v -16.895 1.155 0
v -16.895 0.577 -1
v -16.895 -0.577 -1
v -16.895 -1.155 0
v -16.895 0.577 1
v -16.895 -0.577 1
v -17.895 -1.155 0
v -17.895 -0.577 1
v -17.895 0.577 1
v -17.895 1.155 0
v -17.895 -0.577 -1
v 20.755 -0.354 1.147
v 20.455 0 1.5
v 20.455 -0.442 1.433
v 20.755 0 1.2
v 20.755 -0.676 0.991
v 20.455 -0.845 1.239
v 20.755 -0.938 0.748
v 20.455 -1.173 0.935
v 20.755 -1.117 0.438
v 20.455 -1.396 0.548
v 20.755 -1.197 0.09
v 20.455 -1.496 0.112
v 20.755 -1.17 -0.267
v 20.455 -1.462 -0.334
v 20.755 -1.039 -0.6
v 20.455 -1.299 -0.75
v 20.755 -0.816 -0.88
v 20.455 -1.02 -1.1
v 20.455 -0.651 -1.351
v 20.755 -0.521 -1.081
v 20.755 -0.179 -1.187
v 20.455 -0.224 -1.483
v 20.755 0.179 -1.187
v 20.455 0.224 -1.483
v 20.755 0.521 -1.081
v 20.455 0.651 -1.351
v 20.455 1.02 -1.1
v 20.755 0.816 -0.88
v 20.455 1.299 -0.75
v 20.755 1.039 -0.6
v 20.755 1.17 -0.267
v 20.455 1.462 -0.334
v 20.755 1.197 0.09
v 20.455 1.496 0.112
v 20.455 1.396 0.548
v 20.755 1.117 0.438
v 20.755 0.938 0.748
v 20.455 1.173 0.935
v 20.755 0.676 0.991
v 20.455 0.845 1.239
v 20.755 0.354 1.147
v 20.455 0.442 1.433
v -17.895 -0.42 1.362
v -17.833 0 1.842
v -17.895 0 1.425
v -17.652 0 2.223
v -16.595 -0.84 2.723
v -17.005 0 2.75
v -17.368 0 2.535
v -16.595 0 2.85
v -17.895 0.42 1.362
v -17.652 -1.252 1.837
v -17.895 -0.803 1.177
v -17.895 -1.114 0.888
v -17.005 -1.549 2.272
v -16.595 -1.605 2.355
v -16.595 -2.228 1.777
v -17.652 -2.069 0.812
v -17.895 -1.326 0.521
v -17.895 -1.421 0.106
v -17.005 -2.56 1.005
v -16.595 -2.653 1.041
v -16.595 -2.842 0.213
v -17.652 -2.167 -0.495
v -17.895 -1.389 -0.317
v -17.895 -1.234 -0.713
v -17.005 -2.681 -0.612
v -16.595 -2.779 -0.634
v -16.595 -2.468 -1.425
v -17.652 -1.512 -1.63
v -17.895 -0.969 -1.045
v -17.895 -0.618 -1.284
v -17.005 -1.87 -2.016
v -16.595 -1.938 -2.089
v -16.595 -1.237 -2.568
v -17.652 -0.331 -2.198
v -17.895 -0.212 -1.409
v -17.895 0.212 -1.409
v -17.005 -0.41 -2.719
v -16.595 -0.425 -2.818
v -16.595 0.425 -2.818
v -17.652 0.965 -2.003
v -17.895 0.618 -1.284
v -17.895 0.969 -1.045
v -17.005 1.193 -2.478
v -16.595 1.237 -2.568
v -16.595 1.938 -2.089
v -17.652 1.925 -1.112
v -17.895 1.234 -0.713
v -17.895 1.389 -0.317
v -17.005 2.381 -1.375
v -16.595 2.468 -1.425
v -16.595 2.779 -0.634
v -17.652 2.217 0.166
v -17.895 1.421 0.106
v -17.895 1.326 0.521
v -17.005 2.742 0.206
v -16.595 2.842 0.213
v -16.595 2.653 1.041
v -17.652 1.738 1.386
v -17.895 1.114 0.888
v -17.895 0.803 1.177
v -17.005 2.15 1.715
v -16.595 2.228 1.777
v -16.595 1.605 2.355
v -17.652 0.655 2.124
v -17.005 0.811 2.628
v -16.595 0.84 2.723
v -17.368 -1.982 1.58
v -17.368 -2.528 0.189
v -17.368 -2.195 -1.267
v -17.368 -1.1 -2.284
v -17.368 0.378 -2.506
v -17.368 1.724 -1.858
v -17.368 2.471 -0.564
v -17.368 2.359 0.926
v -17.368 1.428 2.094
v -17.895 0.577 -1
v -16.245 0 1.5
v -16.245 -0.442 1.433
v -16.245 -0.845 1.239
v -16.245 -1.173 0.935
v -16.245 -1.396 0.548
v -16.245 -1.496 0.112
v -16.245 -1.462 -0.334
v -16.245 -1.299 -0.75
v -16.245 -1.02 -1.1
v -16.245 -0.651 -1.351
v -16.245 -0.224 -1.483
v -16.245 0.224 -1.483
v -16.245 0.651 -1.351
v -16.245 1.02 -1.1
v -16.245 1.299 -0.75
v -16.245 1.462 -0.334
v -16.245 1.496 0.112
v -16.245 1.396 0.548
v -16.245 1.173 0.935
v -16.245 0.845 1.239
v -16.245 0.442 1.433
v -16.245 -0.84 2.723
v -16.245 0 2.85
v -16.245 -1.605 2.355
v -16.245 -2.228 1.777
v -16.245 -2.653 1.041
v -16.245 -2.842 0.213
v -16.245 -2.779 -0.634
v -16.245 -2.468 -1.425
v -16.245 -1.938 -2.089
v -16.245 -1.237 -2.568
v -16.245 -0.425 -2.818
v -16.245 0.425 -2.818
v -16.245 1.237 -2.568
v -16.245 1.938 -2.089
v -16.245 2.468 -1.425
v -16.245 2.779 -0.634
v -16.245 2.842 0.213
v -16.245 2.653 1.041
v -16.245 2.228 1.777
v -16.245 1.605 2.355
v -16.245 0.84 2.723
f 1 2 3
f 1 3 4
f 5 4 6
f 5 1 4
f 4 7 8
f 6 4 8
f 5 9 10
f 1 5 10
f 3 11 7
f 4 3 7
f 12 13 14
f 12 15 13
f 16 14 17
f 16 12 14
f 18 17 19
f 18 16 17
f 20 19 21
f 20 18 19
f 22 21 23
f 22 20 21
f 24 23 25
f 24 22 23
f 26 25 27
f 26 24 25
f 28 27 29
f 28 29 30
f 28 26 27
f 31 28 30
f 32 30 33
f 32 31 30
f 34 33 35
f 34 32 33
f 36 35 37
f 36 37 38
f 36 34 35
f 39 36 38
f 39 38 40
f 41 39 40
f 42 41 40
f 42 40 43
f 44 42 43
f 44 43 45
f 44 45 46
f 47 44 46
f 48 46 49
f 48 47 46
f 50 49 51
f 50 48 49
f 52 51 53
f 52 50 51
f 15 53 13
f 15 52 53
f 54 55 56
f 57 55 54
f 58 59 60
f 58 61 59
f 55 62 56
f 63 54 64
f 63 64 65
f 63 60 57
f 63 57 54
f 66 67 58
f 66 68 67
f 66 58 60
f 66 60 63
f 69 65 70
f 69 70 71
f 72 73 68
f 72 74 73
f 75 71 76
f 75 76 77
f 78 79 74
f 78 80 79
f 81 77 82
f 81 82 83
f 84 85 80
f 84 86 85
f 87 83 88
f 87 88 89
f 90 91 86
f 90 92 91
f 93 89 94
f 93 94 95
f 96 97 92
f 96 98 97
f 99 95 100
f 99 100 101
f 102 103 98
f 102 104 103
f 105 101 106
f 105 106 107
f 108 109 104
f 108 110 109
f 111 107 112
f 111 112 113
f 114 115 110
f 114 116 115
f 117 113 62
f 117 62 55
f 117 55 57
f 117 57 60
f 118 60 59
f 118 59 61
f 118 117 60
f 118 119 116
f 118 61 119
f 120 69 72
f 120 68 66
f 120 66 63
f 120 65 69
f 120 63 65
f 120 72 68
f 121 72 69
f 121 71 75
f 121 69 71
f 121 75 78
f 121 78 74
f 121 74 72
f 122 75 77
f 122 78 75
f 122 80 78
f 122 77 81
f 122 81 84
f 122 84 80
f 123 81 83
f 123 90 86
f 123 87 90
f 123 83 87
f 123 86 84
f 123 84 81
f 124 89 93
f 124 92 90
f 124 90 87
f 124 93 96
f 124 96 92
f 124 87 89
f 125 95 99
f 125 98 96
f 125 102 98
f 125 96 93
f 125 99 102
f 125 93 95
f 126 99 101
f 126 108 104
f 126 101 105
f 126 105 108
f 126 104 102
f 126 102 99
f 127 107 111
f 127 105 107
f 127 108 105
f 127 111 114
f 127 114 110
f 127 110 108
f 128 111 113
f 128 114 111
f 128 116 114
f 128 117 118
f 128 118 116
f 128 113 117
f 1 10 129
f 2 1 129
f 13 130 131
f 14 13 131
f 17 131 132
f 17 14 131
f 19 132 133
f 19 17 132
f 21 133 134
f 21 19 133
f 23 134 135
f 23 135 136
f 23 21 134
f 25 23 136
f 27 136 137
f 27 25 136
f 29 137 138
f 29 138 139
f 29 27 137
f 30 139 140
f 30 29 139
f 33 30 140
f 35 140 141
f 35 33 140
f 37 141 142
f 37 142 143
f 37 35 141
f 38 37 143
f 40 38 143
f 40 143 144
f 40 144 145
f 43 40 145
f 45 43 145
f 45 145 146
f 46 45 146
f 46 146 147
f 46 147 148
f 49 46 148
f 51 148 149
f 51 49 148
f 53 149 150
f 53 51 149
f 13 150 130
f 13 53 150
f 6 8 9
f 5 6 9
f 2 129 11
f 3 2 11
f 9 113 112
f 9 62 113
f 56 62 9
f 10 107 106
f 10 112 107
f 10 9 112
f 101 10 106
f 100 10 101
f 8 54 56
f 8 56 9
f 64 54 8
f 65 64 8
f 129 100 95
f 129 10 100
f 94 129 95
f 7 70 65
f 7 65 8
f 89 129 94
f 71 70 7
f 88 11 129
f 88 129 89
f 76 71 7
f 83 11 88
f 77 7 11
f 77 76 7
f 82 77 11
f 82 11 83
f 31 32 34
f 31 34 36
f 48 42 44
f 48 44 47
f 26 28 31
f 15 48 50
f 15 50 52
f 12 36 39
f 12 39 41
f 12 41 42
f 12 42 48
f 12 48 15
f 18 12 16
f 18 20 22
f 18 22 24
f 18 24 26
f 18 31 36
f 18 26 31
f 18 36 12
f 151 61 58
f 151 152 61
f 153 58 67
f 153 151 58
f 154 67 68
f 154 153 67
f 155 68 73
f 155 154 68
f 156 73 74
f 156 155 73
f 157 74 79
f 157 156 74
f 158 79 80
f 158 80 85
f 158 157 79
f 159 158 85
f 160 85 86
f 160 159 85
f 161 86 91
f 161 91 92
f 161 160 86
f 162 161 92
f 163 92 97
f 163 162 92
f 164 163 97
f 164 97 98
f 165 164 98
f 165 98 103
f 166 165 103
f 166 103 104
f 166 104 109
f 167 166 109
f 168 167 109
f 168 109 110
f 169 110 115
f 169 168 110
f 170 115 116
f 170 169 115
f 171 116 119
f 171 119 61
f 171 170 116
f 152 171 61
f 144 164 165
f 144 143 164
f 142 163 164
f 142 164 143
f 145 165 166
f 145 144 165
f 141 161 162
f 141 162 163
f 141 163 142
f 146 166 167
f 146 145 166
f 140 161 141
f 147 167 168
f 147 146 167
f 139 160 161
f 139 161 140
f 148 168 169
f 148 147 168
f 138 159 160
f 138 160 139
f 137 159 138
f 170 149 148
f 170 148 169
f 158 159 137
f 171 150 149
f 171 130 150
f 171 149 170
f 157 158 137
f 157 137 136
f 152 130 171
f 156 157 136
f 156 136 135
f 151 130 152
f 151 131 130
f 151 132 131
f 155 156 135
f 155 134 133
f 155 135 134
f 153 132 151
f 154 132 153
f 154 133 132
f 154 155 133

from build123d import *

# Parameters (mm, degrees)
KES_EKSTR_ZYON1_DEPTH = 1


with BuildPart() as part:
    # Çizim1 → Döndür1 (revolve)
    with BuildSketch(Plane.XY, mode=Mode.PRIVATE) as d_nd_r1_sk:
        with BuildLine():
            Line((-17.895152368, 0), (-17.895152368, 1.425))
            ThreePointArc((-17.895152368, 1.425), (-17.521324038, 2.389446085), (-16.595152368, 2.85))
            Line((-16.595152368, 2.85), (-16.245152368, 2.85))
            Line((-16.245152368, 2.85), (-16.245152368, 1.5))
            Line((-16.245152368, 1.5), (20.454847632, 1.5))
            Line((20.454847632, 1.5), (20.754847632, 1.2))
            Line((20.754847632, 1.2), (20.754847632, 0))
            Line((20.754847632, 0), (-17.895152368, 0))
        make_face()
    revolve(d_nd_r1_sk.sketch.rotate(Axis((-8.74874301, 0, 0), (1, 0, 0)), 90), axis=Axis((-8.74874301, 0, 0), (1, 0, 0)))

    # Çizim2 → Kes-Ekstrüzyon1 (cut)
    with BuildSketch(Plane.ZY.offset(17.895152368)):
        Polygon((0, 1.154700538), (-1, 0.577350269), (-1, -0.577350269), (0, -1.154700538), (1, -0.577350269), (1, 0.577350269), align=None)
    extrude(amount=-KES_EKSTR_ZYON1_DEPTH, mode=Mode.SUBTRACT)


solid = part.part
